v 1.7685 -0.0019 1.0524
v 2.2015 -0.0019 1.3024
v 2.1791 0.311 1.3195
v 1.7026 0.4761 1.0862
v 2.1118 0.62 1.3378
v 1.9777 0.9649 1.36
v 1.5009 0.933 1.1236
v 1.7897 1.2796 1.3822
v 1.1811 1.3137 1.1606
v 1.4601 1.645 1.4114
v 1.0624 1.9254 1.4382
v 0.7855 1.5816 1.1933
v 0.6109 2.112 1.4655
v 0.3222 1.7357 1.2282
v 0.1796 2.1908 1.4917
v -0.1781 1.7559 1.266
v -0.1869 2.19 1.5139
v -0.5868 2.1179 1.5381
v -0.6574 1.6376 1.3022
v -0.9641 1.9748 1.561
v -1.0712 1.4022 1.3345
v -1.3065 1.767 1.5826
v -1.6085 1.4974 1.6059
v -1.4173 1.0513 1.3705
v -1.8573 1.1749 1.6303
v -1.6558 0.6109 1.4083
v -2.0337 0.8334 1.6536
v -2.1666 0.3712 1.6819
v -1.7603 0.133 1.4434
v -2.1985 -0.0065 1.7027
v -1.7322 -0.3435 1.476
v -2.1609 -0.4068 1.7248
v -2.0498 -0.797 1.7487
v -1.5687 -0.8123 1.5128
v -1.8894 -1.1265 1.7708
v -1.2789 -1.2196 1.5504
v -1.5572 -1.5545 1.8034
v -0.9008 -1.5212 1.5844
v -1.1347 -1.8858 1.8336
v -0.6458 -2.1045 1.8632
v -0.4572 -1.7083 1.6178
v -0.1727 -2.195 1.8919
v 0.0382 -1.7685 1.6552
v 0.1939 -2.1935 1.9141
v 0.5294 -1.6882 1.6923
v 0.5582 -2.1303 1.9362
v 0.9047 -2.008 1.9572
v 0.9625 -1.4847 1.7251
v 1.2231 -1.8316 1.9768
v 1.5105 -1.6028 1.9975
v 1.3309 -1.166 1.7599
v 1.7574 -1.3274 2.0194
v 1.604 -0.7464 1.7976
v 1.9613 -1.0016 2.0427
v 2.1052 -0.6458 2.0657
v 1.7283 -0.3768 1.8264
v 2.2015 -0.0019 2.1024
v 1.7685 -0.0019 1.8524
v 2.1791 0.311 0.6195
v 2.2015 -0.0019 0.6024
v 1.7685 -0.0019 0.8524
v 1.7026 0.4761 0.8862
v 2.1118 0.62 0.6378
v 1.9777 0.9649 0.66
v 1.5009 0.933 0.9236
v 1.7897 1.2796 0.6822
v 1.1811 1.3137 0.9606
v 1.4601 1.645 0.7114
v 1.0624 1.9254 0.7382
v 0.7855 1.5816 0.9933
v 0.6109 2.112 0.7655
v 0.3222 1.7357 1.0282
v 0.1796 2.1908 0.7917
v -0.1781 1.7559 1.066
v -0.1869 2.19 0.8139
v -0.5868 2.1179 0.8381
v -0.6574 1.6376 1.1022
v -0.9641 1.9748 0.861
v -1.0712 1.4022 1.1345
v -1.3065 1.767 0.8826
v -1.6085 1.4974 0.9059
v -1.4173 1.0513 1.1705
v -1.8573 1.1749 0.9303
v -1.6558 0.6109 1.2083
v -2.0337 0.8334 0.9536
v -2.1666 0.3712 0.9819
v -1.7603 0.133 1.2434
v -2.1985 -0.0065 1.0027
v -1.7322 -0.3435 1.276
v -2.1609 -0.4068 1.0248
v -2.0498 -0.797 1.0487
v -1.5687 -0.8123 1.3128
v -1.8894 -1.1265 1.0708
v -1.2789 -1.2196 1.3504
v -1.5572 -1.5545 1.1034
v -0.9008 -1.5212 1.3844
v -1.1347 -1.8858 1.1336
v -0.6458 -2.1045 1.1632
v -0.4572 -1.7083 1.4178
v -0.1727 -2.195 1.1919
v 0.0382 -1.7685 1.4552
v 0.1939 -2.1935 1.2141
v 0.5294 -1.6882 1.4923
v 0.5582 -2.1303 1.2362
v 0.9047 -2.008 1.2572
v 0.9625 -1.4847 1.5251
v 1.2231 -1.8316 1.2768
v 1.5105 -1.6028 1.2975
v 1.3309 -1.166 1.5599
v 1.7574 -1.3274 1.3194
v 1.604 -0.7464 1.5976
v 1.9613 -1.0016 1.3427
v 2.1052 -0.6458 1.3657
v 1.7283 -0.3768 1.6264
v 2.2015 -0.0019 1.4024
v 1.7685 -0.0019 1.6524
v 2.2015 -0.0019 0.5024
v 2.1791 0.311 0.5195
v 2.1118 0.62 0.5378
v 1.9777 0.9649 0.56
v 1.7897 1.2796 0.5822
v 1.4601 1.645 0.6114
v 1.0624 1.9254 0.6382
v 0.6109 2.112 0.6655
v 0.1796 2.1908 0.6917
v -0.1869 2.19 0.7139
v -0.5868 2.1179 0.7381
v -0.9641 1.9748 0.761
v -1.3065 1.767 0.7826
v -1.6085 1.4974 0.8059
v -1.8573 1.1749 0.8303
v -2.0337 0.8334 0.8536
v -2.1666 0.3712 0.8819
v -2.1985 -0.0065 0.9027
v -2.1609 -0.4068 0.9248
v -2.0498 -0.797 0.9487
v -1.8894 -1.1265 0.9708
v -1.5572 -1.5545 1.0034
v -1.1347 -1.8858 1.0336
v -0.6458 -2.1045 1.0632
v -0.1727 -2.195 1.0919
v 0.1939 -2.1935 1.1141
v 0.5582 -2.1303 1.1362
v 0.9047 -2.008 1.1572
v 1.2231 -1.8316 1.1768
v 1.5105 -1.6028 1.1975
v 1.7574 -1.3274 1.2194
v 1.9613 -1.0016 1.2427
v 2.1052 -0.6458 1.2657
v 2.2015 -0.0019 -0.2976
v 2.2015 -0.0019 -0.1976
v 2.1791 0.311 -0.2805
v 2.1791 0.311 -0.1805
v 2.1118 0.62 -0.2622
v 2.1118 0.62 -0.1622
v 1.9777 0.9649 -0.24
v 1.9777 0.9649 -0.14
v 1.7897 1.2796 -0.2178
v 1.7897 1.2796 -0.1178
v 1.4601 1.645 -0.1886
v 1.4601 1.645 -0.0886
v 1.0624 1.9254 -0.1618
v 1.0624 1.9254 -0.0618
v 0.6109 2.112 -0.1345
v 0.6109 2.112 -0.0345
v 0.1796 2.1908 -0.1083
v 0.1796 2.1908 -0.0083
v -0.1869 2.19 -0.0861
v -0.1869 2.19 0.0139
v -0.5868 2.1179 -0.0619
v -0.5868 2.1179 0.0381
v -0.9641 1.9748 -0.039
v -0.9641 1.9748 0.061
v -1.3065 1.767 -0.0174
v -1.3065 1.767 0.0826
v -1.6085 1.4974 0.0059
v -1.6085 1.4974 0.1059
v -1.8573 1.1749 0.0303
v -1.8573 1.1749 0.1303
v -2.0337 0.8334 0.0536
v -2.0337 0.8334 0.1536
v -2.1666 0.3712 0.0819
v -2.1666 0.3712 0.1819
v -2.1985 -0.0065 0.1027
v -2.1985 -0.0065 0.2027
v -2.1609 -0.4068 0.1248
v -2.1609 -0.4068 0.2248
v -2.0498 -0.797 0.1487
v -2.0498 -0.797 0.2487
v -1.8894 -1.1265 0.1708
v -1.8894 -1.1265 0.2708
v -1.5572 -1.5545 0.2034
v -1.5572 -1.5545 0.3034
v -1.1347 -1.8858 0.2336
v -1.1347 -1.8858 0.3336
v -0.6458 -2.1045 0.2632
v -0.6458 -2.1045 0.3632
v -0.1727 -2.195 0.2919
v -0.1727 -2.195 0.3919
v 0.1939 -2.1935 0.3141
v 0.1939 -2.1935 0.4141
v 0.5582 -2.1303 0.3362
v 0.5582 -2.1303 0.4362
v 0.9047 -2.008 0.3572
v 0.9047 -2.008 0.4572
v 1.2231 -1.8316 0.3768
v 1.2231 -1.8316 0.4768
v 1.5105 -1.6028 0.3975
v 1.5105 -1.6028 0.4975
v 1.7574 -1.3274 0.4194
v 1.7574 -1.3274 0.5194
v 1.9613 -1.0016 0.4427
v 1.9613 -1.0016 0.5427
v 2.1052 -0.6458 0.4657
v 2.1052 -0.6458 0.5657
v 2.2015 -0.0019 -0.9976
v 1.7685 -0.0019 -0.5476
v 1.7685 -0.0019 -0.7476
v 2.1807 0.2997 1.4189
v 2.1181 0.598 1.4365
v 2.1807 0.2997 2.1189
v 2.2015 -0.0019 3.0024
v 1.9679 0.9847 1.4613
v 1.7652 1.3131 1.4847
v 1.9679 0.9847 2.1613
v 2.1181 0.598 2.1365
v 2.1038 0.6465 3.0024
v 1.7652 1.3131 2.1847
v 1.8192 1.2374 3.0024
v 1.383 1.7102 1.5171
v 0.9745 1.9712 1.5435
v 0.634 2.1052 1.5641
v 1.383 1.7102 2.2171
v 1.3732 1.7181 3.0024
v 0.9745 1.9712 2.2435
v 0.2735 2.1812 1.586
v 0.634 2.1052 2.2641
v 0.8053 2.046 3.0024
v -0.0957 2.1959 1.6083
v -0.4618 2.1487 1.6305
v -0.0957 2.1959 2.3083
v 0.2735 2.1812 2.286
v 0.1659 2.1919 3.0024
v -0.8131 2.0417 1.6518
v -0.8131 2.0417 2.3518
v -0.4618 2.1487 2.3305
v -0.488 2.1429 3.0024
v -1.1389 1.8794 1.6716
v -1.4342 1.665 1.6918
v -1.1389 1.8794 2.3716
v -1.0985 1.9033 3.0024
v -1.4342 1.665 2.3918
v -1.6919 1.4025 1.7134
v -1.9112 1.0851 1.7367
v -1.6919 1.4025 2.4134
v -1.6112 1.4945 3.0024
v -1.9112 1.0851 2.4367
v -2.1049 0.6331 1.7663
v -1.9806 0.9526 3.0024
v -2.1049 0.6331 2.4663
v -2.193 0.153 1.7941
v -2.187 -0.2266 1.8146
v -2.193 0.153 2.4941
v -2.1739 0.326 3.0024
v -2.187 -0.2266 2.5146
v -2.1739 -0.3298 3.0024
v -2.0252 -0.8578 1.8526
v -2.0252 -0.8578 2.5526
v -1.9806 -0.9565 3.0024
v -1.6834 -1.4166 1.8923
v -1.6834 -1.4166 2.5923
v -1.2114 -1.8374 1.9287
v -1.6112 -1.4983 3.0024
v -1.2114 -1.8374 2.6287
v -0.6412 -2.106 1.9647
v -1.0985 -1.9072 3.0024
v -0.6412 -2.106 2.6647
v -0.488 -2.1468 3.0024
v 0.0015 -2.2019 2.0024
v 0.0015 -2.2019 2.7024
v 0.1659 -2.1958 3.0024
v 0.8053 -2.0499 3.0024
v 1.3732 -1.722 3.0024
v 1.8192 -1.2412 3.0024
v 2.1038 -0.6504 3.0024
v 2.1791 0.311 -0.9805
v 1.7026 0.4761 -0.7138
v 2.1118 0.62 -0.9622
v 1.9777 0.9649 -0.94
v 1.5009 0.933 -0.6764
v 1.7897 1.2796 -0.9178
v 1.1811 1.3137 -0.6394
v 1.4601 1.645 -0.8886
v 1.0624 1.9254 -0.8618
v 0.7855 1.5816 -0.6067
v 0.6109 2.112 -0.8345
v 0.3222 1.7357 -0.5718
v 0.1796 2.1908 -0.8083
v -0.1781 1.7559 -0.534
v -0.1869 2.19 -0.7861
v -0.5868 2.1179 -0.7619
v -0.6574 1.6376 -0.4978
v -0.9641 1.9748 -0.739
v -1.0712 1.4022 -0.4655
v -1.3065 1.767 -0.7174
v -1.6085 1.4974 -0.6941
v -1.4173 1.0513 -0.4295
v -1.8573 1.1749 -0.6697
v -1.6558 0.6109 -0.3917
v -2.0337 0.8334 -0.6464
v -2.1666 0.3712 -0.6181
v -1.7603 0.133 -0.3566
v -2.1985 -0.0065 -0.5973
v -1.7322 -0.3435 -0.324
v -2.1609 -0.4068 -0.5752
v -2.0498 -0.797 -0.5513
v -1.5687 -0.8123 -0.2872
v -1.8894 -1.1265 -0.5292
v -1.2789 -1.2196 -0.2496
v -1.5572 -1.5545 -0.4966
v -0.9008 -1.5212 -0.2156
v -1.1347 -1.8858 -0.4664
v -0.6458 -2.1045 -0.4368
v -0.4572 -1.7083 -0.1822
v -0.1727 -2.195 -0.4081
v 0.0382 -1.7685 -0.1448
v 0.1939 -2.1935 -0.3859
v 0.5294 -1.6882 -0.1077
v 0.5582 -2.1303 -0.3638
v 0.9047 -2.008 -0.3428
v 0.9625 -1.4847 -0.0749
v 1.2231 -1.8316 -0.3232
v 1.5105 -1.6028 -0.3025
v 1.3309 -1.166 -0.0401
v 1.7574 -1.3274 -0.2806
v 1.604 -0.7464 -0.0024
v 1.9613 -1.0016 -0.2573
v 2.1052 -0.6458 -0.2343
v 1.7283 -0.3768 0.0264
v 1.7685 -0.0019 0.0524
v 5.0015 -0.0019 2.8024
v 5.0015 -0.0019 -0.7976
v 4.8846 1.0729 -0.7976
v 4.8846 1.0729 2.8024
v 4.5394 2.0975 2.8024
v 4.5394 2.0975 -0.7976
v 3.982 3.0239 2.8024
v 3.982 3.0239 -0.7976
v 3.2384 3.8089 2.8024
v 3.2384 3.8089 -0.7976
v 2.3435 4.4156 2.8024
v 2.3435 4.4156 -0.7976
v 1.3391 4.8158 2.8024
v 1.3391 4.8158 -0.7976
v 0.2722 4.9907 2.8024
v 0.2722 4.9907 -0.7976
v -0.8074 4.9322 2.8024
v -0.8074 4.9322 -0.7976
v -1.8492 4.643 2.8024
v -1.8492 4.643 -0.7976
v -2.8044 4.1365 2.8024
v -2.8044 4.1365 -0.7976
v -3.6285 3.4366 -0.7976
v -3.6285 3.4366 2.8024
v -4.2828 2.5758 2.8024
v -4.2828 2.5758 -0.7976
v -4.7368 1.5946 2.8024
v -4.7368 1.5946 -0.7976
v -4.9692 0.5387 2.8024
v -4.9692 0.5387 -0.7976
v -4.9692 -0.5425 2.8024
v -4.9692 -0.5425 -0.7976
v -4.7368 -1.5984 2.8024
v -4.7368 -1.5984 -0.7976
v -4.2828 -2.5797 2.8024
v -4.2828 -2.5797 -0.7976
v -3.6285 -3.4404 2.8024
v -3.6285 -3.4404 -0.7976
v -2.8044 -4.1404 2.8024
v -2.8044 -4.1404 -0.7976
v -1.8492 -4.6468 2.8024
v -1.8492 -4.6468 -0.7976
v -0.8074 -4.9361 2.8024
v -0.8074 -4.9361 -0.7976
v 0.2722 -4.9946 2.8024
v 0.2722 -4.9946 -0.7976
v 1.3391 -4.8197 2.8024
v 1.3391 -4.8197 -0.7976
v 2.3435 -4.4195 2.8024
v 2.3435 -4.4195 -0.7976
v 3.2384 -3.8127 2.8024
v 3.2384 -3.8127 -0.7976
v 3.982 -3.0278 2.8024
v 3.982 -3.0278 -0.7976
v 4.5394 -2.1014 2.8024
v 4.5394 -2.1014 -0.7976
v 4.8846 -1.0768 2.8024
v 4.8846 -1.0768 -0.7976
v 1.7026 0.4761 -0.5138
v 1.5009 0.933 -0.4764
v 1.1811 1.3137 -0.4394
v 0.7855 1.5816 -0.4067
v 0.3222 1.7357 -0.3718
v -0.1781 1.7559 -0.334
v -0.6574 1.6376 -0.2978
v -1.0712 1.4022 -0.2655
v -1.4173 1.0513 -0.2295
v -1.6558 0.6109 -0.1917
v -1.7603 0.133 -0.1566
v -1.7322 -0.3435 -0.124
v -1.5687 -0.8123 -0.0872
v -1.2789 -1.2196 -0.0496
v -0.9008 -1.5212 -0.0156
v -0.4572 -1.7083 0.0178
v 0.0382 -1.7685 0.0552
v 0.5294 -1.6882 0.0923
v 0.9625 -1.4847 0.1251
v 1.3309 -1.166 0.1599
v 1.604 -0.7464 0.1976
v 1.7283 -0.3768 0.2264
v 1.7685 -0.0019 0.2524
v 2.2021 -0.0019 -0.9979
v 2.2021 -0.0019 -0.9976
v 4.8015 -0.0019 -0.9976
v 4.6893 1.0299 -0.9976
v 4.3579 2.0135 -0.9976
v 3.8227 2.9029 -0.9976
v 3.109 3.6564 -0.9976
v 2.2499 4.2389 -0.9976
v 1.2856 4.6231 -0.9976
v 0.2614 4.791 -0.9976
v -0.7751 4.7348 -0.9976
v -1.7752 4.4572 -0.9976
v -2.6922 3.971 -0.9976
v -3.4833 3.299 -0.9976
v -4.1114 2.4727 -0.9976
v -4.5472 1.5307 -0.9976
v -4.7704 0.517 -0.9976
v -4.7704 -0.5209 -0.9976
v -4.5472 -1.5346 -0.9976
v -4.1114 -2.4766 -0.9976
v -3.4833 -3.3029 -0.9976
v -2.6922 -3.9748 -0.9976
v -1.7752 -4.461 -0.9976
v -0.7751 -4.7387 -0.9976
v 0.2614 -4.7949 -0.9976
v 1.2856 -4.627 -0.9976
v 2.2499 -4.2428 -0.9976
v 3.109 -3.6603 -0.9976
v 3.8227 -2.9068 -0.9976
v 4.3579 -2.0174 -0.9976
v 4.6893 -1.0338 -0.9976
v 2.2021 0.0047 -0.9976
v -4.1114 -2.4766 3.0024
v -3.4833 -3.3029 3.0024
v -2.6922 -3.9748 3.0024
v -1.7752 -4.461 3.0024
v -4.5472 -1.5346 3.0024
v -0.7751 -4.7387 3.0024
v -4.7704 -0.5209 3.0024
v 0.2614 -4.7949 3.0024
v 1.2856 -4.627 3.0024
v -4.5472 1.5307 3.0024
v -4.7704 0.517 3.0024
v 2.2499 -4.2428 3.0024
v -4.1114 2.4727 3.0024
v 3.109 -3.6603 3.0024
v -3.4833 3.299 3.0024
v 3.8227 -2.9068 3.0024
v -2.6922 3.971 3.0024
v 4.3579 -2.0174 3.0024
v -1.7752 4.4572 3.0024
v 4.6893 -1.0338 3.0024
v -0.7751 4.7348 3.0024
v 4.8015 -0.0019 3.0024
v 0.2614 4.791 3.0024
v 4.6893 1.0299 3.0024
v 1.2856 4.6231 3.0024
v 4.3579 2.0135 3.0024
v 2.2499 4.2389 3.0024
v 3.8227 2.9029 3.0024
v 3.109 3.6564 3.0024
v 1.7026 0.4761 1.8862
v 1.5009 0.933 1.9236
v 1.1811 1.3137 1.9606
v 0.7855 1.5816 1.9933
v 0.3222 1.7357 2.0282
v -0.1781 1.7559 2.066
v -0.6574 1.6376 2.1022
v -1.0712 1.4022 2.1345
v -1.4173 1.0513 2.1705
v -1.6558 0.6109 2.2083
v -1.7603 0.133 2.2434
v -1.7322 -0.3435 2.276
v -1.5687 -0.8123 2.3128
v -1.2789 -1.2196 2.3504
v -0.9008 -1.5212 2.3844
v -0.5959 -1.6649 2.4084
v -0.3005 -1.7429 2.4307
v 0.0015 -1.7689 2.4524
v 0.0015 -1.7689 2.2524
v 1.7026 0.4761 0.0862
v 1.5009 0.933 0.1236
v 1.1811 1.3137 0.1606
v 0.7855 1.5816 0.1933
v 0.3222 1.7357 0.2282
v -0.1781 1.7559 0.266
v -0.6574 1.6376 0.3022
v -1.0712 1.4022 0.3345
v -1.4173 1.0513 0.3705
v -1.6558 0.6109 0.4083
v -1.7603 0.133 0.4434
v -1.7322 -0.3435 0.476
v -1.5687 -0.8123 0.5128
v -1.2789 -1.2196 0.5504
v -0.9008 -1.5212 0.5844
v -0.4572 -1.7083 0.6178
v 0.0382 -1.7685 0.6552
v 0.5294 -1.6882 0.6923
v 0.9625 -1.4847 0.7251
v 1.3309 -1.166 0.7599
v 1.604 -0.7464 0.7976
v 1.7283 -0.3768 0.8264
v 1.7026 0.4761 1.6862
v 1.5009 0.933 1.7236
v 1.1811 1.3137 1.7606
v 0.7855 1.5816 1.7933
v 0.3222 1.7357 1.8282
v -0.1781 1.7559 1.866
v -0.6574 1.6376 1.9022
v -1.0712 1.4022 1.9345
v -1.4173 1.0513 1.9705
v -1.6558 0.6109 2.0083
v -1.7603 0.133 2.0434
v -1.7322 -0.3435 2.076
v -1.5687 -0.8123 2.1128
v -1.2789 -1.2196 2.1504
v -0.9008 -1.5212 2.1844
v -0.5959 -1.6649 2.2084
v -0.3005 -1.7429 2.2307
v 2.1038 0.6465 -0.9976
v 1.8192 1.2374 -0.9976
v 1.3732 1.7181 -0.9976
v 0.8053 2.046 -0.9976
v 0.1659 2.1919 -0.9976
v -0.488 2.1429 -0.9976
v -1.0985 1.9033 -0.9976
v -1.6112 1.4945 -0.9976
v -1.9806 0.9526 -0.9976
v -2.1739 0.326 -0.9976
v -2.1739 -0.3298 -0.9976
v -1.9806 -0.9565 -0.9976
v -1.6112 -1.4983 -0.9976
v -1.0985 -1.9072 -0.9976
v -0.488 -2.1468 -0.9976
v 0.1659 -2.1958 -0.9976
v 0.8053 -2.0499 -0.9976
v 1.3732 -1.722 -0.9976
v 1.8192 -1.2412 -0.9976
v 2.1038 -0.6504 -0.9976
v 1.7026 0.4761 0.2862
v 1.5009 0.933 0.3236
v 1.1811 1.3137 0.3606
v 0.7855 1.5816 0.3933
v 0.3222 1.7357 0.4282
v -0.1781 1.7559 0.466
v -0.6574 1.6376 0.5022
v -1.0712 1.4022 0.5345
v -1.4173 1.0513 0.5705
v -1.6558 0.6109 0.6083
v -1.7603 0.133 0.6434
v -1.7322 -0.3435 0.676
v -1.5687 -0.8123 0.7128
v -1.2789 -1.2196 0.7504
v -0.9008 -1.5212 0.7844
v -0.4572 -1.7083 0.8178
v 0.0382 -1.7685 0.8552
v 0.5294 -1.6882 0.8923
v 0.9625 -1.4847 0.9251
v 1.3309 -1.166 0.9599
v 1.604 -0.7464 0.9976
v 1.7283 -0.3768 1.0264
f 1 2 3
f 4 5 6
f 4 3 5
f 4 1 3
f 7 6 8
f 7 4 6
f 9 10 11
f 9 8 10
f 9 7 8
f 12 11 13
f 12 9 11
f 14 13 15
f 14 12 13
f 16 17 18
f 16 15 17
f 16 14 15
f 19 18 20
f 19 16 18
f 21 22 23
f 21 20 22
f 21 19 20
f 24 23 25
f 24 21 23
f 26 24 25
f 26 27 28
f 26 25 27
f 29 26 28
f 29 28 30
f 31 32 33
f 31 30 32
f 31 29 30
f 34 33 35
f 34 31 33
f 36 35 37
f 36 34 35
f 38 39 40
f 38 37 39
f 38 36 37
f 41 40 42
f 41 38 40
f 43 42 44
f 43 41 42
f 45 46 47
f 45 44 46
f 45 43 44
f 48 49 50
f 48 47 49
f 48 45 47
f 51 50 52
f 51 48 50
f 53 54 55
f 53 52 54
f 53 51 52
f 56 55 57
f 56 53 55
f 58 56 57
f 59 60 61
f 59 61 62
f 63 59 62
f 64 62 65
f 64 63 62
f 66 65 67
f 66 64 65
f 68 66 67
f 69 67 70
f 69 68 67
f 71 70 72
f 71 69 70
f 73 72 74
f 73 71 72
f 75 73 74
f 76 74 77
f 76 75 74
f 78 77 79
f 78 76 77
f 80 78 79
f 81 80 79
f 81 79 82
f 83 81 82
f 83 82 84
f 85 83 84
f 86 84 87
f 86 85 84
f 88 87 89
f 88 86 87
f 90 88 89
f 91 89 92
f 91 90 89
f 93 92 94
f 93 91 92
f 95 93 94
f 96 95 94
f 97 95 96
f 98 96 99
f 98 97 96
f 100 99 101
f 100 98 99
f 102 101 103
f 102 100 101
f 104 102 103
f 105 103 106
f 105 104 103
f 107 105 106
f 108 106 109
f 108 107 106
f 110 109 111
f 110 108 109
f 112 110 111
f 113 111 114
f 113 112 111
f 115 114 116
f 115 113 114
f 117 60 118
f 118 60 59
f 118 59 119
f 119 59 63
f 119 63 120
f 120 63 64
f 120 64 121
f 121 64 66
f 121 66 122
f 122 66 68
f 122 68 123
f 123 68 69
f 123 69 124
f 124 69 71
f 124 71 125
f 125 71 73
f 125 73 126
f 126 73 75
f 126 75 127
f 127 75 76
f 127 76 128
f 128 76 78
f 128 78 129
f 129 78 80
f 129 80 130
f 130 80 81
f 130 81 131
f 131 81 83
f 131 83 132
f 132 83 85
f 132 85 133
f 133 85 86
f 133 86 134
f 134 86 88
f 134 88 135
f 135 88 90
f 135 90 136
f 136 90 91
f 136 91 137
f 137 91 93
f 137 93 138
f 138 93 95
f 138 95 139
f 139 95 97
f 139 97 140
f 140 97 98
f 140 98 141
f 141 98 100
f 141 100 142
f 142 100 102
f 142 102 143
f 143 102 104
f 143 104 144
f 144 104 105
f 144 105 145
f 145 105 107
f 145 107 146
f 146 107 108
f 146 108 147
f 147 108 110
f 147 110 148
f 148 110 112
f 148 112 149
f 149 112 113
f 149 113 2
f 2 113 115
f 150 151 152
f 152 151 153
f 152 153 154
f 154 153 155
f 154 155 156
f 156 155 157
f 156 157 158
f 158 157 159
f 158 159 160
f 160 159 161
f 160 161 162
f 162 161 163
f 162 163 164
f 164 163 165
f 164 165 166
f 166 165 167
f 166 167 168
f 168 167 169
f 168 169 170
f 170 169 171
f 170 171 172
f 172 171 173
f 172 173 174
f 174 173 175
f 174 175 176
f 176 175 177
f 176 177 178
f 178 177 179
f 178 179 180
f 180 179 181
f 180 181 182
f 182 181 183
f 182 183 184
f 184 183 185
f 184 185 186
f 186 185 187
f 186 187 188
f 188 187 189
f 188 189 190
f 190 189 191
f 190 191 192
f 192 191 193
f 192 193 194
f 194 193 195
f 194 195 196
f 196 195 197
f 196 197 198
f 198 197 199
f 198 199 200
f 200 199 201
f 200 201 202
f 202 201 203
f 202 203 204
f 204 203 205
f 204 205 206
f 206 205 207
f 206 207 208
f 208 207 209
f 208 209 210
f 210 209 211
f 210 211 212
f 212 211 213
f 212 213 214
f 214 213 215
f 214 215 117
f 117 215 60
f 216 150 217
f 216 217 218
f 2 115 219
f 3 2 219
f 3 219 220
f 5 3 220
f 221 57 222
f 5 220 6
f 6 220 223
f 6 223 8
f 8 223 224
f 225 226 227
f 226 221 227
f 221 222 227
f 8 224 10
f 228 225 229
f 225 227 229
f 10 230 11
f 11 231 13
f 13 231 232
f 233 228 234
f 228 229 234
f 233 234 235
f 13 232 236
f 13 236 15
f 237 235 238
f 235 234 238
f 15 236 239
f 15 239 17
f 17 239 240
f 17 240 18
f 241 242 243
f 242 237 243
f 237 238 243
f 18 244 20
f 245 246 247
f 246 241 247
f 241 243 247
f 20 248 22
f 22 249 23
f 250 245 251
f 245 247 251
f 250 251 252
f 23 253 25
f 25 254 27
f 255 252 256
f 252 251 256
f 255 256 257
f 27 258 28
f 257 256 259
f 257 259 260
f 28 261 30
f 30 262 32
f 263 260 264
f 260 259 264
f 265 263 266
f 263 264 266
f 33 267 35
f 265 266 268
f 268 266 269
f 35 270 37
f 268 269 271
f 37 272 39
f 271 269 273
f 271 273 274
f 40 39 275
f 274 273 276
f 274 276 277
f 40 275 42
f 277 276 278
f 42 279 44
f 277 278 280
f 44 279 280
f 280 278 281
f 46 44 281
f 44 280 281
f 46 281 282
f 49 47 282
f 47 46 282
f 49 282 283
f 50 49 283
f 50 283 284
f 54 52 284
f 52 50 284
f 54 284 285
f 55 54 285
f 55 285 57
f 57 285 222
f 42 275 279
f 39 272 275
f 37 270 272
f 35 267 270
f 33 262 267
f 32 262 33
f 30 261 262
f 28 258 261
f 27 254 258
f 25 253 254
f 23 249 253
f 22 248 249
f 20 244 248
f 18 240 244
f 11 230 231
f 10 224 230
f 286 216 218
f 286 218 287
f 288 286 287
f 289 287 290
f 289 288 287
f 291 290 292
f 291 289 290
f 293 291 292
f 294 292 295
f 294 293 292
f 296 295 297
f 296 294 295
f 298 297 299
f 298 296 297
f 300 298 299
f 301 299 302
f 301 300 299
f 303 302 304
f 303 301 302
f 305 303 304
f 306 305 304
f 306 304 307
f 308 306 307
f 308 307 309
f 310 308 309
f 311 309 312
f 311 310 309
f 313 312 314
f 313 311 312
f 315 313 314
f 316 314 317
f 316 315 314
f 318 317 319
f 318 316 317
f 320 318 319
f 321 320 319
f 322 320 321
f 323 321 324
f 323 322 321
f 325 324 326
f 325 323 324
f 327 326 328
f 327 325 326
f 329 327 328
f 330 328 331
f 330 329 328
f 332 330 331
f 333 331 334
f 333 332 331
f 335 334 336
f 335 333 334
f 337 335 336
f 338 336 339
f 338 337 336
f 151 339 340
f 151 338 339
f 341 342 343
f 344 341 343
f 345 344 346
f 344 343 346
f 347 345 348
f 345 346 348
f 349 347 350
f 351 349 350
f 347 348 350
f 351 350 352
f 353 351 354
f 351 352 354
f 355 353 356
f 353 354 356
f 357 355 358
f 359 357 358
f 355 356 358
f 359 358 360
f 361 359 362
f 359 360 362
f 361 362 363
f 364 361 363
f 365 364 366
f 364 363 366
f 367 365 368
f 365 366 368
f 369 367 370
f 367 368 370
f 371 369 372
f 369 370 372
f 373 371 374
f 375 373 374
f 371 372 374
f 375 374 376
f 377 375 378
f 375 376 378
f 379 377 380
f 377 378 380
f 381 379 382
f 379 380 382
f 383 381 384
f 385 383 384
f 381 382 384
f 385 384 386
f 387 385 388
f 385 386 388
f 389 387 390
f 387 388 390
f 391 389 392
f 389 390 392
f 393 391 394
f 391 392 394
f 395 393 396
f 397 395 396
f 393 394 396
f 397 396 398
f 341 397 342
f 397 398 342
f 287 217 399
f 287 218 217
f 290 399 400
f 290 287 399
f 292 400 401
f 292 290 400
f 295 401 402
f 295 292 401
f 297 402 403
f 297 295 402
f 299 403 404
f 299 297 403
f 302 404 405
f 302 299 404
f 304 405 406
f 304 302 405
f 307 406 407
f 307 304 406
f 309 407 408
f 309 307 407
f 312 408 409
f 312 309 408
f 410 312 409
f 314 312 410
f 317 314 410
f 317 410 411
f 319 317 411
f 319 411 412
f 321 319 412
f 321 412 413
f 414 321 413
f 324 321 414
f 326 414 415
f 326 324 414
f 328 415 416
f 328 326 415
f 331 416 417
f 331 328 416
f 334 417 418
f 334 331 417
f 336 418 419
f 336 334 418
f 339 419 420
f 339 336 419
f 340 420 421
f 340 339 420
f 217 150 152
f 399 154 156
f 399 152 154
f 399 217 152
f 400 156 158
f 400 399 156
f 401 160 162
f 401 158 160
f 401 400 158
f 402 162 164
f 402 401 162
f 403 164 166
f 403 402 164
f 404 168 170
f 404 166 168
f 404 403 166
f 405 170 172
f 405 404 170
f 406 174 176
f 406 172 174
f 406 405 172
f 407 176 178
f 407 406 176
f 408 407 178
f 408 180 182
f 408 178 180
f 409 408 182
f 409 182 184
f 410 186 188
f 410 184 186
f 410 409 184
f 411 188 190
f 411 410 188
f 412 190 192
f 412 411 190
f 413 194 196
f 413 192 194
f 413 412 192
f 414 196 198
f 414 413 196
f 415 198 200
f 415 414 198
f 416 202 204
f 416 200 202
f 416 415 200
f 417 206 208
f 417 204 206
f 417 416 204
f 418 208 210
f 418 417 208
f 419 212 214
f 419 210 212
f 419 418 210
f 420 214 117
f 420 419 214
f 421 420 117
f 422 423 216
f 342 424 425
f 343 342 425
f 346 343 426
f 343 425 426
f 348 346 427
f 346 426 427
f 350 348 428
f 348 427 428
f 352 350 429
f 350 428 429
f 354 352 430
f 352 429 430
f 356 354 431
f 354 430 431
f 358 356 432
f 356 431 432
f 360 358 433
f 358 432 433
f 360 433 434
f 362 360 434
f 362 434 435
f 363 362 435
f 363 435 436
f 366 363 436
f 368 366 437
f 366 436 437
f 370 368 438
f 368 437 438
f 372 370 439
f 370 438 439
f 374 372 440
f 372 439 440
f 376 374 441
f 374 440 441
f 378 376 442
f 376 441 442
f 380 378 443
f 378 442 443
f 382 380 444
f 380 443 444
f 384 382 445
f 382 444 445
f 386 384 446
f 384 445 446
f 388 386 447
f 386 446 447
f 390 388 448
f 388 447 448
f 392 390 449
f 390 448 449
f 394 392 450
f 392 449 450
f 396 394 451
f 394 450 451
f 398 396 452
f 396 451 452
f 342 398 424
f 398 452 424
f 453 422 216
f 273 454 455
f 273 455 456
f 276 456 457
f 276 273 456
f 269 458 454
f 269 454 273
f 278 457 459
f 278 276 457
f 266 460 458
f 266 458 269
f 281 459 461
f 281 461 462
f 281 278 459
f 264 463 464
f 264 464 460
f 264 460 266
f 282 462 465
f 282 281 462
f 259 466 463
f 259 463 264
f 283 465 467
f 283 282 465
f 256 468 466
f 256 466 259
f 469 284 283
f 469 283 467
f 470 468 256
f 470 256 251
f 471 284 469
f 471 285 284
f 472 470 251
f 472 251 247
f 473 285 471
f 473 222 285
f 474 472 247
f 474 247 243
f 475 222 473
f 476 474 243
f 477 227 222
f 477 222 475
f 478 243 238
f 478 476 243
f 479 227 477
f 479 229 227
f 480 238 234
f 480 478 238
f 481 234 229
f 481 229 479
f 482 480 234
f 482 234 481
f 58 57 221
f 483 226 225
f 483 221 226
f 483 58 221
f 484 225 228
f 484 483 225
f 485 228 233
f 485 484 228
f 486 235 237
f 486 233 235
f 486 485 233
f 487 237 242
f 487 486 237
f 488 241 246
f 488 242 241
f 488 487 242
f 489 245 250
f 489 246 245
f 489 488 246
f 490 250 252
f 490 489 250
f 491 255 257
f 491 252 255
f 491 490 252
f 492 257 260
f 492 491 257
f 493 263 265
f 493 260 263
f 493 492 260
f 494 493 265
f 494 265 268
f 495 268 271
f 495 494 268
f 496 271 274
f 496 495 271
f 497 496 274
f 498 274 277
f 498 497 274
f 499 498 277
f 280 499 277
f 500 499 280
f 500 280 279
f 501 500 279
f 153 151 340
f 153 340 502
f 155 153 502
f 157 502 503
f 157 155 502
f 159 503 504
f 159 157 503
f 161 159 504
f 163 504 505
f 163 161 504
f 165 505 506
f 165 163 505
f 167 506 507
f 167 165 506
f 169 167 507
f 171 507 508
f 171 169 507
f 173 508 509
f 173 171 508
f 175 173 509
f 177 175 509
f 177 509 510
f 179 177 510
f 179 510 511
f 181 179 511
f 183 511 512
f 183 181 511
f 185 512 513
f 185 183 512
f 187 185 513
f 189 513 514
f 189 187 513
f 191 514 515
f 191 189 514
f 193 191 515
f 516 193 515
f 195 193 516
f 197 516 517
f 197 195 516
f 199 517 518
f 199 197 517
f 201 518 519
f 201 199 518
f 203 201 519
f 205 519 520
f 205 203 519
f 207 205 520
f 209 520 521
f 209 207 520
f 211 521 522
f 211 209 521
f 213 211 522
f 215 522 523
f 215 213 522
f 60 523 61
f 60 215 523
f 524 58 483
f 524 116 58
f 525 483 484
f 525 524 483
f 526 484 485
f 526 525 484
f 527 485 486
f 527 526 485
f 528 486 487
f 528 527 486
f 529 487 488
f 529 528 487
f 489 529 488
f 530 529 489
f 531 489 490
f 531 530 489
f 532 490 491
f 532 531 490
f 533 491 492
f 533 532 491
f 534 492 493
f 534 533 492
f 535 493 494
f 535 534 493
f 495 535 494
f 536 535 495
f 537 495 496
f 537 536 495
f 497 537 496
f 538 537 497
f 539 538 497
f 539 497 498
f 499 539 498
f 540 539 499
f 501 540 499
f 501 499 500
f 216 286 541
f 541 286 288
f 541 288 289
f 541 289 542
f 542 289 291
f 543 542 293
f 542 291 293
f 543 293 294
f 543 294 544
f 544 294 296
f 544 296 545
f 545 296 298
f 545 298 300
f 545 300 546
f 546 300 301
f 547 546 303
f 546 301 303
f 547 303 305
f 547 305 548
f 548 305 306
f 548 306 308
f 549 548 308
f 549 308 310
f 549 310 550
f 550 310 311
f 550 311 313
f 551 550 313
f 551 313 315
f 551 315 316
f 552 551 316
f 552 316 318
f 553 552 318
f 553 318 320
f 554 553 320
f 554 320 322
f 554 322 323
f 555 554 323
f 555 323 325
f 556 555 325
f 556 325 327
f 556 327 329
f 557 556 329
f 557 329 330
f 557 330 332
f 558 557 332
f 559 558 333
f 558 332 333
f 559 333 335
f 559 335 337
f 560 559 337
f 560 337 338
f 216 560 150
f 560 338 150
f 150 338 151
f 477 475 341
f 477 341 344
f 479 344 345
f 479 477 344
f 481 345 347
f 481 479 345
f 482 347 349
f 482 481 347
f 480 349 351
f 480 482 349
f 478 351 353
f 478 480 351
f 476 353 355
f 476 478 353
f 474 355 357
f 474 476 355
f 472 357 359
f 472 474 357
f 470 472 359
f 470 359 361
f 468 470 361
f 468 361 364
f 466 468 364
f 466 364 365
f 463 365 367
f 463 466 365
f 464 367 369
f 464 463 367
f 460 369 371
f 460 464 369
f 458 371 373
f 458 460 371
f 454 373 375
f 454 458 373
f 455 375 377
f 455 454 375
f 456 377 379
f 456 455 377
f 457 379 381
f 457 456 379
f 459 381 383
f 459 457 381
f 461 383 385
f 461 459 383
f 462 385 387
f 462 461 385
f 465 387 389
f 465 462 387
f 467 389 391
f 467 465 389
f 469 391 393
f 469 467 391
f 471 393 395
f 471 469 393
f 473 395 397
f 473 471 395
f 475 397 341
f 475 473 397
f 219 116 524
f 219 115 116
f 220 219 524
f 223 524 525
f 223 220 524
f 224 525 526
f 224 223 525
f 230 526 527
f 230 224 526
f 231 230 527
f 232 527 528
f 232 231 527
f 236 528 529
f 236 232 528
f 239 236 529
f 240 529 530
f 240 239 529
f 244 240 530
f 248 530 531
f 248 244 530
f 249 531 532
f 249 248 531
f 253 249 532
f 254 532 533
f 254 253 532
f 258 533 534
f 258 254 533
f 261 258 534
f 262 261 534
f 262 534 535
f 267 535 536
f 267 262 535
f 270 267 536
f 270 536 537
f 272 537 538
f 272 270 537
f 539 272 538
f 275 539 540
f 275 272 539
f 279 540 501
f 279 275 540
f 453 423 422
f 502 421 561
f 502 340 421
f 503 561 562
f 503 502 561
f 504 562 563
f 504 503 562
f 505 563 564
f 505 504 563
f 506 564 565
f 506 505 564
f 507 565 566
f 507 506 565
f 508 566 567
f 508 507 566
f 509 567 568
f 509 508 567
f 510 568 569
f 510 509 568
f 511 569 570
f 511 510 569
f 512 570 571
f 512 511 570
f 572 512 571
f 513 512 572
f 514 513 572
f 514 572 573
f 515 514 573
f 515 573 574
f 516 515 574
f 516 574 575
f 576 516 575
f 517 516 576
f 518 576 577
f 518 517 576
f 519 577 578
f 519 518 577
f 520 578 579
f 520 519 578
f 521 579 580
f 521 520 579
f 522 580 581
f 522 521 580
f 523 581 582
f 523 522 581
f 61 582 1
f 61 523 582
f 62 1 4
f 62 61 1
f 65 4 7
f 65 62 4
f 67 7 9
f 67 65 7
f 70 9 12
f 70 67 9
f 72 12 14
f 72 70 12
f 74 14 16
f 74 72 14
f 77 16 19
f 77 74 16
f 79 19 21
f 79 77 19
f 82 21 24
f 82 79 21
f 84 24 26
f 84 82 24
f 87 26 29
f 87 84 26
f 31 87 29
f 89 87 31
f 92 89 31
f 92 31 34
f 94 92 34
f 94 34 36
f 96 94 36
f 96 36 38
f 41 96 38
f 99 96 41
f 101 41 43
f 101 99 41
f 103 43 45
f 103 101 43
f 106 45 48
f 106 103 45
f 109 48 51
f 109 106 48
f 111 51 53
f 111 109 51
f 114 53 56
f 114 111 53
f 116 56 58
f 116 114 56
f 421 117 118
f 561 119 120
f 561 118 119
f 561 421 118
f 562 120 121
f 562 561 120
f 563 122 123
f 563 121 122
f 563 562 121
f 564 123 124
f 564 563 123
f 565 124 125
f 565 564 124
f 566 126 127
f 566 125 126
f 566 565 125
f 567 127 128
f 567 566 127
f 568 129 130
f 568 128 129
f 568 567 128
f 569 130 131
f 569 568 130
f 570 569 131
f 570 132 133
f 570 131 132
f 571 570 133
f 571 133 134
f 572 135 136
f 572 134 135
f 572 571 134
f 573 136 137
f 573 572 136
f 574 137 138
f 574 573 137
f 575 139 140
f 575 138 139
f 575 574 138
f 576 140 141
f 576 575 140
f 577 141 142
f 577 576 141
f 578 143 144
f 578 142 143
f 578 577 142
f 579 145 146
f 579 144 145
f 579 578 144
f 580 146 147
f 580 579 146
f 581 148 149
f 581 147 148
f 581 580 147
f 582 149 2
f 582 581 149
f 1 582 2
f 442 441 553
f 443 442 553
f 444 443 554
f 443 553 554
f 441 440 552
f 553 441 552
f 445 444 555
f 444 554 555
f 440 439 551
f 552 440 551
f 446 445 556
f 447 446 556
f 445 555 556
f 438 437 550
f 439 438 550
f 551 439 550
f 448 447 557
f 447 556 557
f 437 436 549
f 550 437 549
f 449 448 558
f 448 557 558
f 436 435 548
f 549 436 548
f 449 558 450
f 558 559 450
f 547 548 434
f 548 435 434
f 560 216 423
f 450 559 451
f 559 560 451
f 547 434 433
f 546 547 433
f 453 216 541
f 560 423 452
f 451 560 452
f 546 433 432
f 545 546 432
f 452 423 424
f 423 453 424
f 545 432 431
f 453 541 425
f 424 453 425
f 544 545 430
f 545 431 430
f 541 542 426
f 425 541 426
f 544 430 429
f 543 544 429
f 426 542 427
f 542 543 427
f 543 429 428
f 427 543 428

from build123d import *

# Parameters (mm, degrees)
SKETCH_1_R        = 2.5
EXTRUDE_1_DEPTH   = 2
CHAMFER_2_SIZE    = 0.1
HOLE_WIZARD_M21_D = 2.2
THREAD_1_PITCH    = 0.4
SCALE_1_SCALE     = 2


with BuildPart() as part:
    # Sketch 1 → Бобышка-Вытянуть1 (new body)
    with BuildSketch(Plane.XY):
        Circle(SKETCH_1_R)
    extrude(amount=EXTRUDE_1_DEPTH)

    # Фаска2
    chamfer_2_edges = [part.edges().sort_by_distance(p)[0] for p in [
        (-2.5, 0, 0),
        (-2.5, 0, 2),
    ]]
    chamfer(chamfer_2_edges, length=CHAMFER_2_SIZE)

    # Отверстие с зазором M21 (through all)
    with Locations(Plane(origin=(0, 0, 0), x_dir=(-1, 0, 0), z_dir=(0, 0, -1))):
        with Locations((0, 0)):
            Hole(HOLE_WIZARD_M21_D / 2)

    # Резьба1: the profile of Sketch 1 2 profile screwed along a right-hand helix of 3.75 turns, 6 arcs to a turn; built about Z, then put on its axis
    thread_1_z = Axis((0, 0, 0), (0, 0, 1))
    thread_1_corners = [(1.1003, 0, -0.000173205), (1.1003, 0, 0.350173204), (0.88349365, 0, 0.224999999), (0.88349365, 0, 0.124999999)]
    with BuildLine(mode=Mode.PRIVATE) as thread_1_profile:
        Line(thread_1_corners[0], thread_1_corners[1])
        Line(thread_1_corners[1], thread_1_corners[2])
        Line(thread_1_corners[2], thread_1_corners[3])
        Line(thread_1_corners[3], thread_1_corners[0])
    thread_1_cap = Face(thread_1_profile.wire())
    thread_1_turn_angles = [0, 30, 60, 90, 120, 150, 180, 210, 240, 270, 300, 330, 360]
    thread_1_turn_weights = [1, 0.8660254037844387, 1, 0.8660254037844387, 1, 0.8660254037844387, 1, 0.8660254037844387, 1, 0.8660254037844387, 1, 0.8660254037844387, 1]
    thread_1_turn_rails = [Edge.make_bspline([Vector(p[0], p[1], 0).rotate(thread_1_z, thread_1_turn_angles[k]) / thread_1_turn_weights[k] + Vector(0, 0, p[2] + THREAD_1_PITCH * thread_1_turn_angles[k] / 360) for k in range(13)], [0, 0, 0, 1, 1, 2, 2, 3, 3, 4, 4, 5, 5, 6, 6, 6], 2, thread_1_turn_weights) for p in thread_1_corners]
    thread_1_turn_sides = [Face.make_surface_from_curves(thread_1_turn_rails[p[0]], thread_1_turn_rails[p[1]]) for p in [(0, 1), (1, 2), (2, 3), (3, 0)]]
    thread_1_last_angles = [1080, 1110, 1140, 1170, 1200, 1230, 1260, 1290, 1320, 1335, 1350]
    thread_1_last_weights = [1, 0.8660254037844387, 1, 0.8660254037844387, 1, 0.8660254037844387, 1, 0.8660254037844387, 1, 0.9659258262890683, 1]
    thread_1_last_rails = [Edge.make_bspline([Vector(p[0], p[1], 0).rotate(thread_1_z, thread_1_last_angles[k]) / thread_1_last_weights[k] + Vector(0, 0, p[2] + THREAD_1_PITCH * thread_1_last_angles[k] / 360) for k in range(11)], [0, 0, 0, 1, 1, 2, 2, 3, 3, 4, 4, 5, 5, 5], 2, thread_1_last_weights) for p in thread_1_corners]
    thread_1_last_sides = [Face.make_surface_from_curves(thread_1_last_rails[p[0]], thread_1_last_rails[p[1]]) for p in [(0, 1), (1, 2), (2, 3), (3, 0)]]
    thread_1 = Plane(origin=(0, 0, 0), x_dir=(1, 0, 0), z_dir=(0, 0, 1)) * Solid(Shell([*[p.moved(Location((0, 0, THREAD_1_PITCH * i))) for i in range(3) for p in thread_1_turn_sides], *thread_1_last_sides, thread_1_cap, thread_1_cap.rotate(thread_1_z, 1350).moved(Location((0, 0, THREAD_1_PITCH * 1350 / 360)))]))
    add(thread_1)


with BuildPart() as part_1:
    # Масштаб1: scaled about (-0.001502253, 0.001928921, 0.997553273)
    add(part.part.scale(SCALE_1_SCALE).moved(Location((0.001502253, -0.001928921, -0.997553273))))


solid = part_1.part
